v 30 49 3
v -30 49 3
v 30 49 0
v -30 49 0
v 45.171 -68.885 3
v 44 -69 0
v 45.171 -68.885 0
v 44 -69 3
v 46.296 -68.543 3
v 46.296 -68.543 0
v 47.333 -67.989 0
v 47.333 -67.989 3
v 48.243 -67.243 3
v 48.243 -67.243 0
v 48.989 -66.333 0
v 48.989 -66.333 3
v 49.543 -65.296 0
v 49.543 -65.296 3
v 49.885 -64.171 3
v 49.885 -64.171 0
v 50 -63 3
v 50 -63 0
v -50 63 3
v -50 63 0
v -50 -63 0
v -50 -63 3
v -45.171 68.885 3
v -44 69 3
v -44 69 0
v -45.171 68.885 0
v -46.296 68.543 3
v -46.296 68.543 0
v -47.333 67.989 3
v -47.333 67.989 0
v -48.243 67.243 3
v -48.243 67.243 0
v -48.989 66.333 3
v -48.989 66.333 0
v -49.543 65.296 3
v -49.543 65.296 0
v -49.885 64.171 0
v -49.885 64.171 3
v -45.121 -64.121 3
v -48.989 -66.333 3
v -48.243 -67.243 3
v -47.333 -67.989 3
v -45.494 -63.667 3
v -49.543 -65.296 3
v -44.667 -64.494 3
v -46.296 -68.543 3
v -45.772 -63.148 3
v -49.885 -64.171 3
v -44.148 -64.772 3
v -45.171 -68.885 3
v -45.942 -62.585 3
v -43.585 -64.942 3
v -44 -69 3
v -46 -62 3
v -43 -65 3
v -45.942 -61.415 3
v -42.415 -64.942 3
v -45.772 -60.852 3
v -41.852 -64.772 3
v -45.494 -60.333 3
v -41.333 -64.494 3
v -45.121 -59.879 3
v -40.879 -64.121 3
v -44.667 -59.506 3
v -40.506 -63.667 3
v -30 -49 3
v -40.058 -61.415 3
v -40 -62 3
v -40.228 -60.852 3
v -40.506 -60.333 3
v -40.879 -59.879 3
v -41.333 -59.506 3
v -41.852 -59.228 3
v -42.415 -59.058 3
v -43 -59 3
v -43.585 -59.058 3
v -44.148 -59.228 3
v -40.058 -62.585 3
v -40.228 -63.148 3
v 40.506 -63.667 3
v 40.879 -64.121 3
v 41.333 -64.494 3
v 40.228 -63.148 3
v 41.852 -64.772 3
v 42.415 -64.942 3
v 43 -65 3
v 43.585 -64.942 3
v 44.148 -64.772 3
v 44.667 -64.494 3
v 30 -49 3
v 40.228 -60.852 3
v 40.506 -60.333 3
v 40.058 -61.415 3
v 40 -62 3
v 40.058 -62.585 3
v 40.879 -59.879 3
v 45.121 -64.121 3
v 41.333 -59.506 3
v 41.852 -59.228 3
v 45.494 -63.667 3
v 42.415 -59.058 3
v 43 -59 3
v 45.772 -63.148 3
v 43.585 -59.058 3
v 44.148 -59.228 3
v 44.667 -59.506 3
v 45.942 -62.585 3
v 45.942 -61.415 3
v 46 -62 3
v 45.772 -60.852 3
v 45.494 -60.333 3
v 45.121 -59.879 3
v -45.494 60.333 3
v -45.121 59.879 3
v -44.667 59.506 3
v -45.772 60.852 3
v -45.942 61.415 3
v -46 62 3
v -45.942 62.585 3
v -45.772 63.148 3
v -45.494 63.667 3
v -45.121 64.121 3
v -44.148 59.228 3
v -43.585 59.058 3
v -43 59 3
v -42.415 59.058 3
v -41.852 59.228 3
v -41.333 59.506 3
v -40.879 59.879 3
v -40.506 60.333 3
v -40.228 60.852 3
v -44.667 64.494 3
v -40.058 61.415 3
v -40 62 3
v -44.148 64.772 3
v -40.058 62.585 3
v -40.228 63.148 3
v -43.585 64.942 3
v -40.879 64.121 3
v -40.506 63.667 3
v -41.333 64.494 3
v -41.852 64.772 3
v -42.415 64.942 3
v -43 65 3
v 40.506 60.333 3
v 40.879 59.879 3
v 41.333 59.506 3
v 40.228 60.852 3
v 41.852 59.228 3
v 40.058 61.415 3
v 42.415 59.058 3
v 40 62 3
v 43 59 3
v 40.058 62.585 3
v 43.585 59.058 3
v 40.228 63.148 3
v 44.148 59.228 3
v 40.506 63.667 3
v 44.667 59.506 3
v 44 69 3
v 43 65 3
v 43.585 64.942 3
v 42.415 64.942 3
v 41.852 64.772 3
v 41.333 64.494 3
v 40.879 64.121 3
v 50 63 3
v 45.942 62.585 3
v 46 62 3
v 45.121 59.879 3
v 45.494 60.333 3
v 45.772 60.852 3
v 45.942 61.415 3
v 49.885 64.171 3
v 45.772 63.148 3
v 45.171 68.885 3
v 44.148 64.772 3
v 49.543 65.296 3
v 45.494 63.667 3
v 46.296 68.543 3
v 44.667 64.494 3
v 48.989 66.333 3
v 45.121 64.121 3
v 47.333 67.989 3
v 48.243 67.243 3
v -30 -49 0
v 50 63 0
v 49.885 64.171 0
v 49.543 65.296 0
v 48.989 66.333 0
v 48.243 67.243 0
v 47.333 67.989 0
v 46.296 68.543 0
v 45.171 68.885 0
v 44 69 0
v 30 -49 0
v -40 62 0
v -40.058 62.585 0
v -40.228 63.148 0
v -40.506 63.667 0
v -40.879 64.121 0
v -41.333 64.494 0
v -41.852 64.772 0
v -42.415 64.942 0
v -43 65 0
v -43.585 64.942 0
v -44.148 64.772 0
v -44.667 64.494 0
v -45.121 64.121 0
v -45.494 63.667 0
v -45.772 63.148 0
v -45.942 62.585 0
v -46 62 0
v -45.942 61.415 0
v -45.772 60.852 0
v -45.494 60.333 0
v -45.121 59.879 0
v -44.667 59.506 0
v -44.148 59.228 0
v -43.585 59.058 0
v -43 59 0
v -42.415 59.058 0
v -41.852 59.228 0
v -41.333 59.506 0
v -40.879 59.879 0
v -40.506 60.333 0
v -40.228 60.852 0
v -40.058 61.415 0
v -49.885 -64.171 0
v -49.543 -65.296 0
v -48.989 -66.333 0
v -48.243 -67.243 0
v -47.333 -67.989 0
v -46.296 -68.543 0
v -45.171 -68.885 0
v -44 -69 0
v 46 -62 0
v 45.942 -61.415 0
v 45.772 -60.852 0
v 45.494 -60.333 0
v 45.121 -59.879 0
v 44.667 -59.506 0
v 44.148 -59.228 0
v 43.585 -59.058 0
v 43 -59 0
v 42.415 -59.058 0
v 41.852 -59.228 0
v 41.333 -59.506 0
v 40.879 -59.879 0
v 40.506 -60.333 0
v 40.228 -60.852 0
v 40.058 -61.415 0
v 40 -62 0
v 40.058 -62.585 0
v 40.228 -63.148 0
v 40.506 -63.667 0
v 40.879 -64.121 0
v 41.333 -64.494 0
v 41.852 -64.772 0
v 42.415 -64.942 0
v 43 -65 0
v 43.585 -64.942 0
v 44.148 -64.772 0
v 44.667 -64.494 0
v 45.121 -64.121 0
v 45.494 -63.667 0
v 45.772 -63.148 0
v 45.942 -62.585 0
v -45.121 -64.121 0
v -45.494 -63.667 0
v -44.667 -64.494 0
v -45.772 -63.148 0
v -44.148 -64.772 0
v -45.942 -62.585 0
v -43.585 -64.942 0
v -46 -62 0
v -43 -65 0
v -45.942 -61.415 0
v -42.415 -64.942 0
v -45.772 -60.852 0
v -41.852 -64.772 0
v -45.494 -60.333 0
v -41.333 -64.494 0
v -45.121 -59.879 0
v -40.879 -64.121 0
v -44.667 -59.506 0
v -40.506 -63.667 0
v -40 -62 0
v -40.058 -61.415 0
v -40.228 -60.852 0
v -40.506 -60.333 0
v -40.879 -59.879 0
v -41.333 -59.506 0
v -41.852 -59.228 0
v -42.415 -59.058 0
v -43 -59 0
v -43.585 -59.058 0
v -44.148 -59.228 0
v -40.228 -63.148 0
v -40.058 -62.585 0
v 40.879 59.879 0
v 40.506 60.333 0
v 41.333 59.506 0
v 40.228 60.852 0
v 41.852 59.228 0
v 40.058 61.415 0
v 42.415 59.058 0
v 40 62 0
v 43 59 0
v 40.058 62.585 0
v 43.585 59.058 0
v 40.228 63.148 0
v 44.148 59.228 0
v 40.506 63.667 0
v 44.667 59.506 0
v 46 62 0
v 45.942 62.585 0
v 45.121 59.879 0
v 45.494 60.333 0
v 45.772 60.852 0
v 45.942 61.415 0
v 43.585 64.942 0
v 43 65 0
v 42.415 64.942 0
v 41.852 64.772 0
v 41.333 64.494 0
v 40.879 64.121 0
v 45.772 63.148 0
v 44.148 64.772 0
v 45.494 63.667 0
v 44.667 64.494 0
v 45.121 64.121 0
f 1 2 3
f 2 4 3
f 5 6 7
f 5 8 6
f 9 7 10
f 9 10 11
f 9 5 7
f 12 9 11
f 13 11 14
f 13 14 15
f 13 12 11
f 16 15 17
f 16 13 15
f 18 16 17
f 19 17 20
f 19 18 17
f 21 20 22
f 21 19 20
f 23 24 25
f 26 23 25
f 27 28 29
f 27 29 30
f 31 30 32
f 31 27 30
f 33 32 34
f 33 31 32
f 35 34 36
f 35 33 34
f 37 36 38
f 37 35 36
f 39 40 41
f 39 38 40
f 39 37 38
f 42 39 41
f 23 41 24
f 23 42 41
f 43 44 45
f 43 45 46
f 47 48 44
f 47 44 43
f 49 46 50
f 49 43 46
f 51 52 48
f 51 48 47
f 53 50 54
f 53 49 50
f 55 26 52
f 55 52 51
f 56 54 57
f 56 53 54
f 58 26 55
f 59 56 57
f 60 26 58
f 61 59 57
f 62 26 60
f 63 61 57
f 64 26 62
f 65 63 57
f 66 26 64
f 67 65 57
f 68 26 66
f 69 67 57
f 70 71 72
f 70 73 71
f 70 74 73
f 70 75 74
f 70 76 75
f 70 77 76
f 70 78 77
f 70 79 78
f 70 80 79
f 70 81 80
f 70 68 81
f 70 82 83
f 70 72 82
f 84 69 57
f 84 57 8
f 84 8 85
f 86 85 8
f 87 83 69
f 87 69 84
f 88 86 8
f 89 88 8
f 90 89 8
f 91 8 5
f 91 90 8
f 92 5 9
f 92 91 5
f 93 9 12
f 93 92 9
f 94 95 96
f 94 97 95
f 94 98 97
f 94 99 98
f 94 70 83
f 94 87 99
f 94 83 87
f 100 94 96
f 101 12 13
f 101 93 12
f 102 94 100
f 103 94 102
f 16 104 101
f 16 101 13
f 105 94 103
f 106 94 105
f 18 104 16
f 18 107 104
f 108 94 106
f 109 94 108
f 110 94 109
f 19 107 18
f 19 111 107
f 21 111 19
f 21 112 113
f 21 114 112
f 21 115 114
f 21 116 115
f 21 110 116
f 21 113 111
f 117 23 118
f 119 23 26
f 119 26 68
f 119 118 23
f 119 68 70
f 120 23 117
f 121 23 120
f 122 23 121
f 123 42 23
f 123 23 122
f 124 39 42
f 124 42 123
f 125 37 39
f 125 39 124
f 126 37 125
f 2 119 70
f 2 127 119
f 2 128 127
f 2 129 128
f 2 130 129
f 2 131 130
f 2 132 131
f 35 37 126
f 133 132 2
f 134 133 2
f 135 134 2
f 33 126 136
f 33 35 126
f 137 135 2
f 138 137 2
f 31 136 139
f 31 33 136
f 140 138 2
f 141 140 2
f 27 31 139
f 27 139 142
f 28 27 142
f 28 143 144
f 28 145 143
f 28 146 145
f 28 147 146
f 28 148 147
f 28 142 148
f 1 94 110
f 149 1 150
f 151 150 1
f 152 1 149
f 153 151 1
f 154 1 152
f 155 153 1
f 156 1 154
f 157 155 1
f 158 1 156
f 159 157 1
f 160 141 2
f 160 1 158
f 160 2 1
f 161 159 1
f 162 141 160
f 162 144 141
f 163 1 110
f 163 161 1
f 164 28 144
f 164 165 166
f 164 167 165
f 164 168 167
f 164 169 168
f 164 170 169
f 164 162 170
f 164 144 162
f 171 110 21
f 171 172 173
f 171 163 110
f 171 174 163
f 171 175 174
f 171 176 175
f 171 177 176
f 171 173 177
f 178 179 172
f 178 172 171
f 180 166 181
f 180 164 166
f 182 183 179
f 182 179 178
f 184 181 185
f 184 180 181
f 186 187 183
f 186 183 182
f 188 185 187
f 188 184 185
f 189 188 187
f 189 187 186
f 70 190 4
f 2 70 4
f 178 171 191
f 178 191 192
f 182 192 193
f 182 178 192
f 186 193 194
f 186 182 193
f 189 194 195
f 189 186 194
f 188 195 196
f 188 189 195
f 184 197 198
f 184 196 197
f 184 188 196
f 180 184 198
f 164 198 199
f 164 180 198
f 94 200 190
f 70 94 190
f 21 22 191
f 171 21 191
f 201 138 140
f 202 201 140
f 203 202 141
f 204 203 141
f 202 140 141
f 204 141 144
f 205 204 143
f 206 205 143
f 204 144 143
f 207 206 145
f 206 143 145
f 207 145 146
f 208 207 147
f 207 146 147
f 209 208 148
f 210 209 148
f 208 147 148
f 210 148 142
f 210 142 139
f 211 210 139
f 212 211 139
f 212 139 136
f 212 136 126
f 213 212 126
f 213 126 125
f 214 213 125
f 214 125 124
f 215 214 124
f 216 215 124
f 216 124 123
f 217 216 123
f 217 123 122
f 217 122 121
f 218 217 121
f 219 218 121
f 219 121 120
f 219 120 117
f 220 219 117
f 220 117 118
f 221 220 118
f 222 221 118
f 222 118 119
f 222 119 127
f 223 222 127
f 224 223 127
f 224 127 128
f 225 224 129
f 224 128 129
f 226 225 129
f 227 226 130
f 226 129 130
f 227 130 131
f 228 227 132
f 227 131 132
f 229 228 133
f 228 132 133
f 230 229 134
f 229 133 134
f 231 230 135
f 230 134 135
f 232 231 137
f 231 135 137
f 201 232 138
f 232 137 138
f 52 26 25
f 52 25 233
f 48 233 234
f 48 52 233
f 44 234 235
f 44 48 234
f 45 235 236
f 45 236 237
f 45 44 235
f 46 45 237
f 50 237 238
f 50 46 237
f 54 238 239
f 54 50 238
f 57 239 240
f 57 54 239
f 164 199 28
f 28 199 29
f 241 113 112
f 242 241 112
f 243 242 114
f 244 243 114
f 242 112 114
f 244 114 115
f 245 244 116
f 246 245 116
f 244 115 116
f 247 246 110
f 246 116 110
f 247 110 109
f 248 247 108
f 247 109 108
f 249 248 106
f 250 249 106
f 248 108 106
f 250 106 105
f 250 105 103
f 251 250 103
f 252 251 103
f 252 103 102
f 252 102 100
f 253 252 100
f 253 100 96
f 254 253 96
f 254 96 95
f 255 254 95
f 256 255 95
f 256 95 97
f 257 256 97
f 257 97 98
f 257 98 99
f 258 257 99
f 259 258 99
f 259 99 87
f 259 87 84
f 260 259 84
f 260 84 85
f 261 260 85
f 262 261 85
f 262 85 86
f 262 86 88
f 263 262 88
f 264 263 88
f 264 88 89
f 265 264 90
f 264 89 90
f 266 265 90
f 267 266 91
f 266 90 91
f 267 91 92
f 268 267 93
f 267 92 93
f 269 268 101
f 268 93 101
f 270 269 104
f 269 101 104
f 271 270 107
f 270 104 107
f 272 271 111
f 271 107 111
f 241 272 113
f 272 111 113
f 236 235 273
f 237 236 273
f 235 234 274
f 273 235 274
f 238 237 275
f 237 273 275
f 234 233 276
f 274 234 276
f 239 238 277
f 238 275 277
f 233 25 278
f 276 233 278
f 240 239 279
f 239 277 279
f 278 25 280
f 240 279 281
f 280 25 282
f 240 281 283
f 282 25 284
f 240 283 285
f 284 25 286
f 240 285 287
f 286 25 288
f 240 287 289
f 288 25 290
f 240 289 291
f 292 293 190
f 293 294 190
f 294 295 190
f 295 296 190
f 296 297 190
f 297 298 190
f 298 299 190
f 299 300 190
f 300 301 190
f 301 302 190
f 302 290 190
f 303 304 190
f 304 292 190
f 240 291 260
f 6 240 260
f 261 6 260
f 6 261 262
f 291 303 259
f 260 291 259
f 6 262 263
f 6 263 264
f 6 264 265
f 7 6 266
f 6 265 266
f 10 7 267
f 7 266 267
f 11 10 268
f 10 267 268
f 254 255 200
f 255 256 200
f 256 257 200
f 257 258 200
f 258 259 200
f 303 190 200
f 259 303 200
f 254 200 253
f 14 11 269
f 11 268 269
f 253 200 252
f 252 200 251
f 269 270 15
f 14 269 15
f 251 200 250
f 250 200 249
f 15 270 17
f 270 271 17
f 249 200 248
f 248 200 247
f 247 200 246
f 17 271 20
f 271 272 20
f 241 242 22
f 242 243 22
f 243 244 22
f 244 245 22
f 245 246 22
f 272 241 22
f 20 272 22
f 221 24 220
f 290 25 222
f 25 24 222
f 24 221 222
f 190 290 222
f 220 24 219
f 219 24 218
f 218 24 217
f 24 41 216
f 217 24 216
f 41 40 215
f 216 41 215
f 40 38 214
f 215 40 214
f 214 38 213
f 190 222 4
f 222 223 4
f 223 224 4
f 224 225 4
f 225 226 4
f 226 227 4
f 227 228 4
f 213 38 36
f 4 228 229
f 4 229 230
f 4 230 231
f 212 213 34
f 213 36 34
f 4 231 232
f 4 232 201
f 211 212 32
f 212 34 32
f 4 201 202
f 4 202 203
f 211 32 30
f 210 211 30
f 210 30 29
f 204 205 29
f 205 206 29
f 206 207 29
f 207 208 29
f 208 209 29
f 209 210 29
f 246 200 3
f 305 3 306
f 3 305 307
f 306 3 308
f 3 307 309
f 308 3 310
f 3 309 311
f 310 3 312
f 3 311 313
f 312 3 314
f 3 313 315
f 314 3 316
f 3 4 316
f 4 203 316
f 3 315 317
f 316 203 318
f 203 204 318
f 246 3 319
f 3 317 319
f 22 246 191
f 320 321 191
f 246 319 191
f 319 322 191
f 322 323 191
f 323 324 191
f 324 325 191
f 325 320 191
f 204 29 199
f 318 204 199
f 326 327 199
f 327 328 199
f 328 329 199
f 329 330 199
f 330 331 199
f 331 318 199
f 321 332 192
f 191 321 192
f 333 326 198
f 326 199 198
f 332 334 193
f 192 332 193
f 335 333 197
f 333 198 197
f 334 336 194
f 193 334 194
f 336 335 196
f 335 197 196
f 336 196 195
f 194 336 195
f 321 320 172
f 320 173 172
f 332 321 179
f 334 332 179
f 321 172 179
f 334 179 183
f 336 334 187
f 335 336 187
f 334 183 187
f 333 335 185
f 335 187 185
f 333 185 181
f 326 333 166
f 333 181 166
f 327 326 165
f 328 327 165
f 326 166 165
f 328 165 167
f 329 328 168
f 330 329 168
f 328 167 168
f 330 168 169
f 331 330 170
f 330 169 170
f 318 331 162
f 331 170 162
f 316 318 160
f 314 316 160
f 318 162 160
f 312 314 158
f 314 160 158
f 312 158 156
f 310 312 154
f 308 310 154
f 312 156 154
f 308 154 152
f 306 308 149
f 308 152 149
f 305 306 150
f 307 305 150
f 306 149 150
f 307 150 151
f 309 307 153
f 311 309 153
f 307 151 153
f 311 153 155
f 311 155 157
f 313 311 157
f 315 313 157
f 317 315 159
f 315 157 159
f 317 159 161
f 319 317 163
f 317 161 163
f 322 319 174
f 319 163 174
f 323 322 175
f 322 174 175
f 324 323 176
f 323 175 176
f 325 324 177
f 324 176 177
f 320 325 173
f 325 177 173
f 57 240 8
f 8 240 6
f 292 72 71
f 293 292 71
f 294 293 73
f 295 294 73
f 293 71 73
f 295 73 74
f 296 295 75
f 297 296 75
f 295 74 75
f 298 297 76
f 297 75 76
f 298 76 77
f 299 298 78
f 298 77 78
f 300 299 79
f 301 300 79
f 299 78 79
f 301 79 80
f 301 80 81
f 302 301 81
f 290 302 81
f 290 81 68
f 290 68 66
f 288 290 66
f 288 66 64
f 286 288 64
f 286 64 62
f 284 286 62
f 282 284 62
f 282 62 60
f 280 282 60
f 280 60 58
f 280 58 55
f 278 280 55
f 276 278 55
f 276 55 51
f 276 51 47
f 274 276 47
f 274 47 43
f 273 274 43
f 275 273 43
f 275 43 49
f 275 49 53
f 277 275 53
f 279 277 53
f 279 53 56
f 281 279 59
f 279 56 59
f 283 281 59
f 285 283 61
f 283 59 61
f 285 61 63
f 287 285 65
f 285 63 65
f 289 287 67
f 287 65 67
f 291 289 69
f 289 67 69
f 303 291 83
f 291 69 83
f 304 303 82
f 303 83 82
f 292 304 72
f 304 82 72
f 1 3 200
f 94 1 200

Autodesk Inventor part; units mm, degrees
ref_plane "YZ Plane" through (0, 0, 0) normal (1, 0, 0) x (0, 1, 0)
ref_plane "XZ Plane" through (0, 0, 0) normal (0, 1, 0) x (-1, 0, 0)
ref_plane "XY Plane" through (0, 0, 0) normal (0, 0, 1) x (1, 0, 0)
sketch "Sketch1" plane through (0, 0, 0) normal (0, 0, 1) x (1, 0, 0)
  line L0 (-50, -69) -> (50, -69)
  line L1 (50, -69) -> (50, 69)
  line L2 (50, 69) -> (-50, 69)
  line L3 (-50, 69) -> (-50, -69)
  line L4 (-50, -69) -> (50, 69) construction
  line L5 (50, -69) -> (-50, 69) construction
  line L6 (30, -49) -> (-30, -49)
  line L7 (-30, -49) -> (-30, 49)
  line L8 (-30, 49) -> (30, 49)
  line L9 (30, 49) -> (30, -49)
  line L10 (30, -49) -> (-30, 49) construction
  line L11 (-30, -49) -> (30, 49) construction
  point P0 (0, 0)
  dimension "d172" = 60
  dimension "d180" = 20
  dimension "d181" = 20
  dimension "d182" = 98
extrude "Plate5" add sketch "Sketch1" along normal blind 3
sketch "Sketch9" plane through (0, 0, 3) normal (0, 0, 1) x (1, 0, 0)
  circle A0 centre (43, -62) radius 3
  line L0 (43, 62) -> (-43, 62) construction
  line L1 (-43, 62) -> (-43, -62) construction
  line L2 (-43, -62) -> (43, -62) construction
  line L3 (43, -62) -> (43, 62) construction
  line L4 (43, 62) -> (-43, -62) construction
  line L5 (-43, 62) -> (43, -62) construction
  circle A1 centre (-43, -62) radius 3
  circle A2 centre (43, 62) radius 3
  circle A3 centre (-43, 62) radius 3
  line L6 (-30, -49) -> (-30, 49) projected
  line L7 (-30, 49) -> (30, 49) projected
  line L8 (30, 49) -> (30, -49) projected
  line L9 (30, -49) -> (-30, -49) projected
  line L10 (50, -69) -> (-50, -69) projected
  line L11 (50, 69) -> (50, -69) projected
  line L12 (-50, 69) -> (50, 69) projected
  line L13 (-50, -69) -> (-50, 69) projected
  circle A4 centre (-43, 0) radius 3 construction
  circle A5 centre (43, 0) radius 3 construction
  point P0 (0, 0)
  dimension "d174" = 6
  dimension "d183" = 7
  dimension "d184" = 7
extrude "Cut2" cut sketch "Sketch9" against normal blind 3 contours A0 | A1 | A2 | A3
fillet "Corner Round1" radius 6 4 edges at (50, 69, 1.5) (-50, 69, 1.5) (-50, -69, 1.5) (50, -69, 1.5)
properties part number "PRS 940-51 FDS Diam way flange 1" material "Stainless Steel"
